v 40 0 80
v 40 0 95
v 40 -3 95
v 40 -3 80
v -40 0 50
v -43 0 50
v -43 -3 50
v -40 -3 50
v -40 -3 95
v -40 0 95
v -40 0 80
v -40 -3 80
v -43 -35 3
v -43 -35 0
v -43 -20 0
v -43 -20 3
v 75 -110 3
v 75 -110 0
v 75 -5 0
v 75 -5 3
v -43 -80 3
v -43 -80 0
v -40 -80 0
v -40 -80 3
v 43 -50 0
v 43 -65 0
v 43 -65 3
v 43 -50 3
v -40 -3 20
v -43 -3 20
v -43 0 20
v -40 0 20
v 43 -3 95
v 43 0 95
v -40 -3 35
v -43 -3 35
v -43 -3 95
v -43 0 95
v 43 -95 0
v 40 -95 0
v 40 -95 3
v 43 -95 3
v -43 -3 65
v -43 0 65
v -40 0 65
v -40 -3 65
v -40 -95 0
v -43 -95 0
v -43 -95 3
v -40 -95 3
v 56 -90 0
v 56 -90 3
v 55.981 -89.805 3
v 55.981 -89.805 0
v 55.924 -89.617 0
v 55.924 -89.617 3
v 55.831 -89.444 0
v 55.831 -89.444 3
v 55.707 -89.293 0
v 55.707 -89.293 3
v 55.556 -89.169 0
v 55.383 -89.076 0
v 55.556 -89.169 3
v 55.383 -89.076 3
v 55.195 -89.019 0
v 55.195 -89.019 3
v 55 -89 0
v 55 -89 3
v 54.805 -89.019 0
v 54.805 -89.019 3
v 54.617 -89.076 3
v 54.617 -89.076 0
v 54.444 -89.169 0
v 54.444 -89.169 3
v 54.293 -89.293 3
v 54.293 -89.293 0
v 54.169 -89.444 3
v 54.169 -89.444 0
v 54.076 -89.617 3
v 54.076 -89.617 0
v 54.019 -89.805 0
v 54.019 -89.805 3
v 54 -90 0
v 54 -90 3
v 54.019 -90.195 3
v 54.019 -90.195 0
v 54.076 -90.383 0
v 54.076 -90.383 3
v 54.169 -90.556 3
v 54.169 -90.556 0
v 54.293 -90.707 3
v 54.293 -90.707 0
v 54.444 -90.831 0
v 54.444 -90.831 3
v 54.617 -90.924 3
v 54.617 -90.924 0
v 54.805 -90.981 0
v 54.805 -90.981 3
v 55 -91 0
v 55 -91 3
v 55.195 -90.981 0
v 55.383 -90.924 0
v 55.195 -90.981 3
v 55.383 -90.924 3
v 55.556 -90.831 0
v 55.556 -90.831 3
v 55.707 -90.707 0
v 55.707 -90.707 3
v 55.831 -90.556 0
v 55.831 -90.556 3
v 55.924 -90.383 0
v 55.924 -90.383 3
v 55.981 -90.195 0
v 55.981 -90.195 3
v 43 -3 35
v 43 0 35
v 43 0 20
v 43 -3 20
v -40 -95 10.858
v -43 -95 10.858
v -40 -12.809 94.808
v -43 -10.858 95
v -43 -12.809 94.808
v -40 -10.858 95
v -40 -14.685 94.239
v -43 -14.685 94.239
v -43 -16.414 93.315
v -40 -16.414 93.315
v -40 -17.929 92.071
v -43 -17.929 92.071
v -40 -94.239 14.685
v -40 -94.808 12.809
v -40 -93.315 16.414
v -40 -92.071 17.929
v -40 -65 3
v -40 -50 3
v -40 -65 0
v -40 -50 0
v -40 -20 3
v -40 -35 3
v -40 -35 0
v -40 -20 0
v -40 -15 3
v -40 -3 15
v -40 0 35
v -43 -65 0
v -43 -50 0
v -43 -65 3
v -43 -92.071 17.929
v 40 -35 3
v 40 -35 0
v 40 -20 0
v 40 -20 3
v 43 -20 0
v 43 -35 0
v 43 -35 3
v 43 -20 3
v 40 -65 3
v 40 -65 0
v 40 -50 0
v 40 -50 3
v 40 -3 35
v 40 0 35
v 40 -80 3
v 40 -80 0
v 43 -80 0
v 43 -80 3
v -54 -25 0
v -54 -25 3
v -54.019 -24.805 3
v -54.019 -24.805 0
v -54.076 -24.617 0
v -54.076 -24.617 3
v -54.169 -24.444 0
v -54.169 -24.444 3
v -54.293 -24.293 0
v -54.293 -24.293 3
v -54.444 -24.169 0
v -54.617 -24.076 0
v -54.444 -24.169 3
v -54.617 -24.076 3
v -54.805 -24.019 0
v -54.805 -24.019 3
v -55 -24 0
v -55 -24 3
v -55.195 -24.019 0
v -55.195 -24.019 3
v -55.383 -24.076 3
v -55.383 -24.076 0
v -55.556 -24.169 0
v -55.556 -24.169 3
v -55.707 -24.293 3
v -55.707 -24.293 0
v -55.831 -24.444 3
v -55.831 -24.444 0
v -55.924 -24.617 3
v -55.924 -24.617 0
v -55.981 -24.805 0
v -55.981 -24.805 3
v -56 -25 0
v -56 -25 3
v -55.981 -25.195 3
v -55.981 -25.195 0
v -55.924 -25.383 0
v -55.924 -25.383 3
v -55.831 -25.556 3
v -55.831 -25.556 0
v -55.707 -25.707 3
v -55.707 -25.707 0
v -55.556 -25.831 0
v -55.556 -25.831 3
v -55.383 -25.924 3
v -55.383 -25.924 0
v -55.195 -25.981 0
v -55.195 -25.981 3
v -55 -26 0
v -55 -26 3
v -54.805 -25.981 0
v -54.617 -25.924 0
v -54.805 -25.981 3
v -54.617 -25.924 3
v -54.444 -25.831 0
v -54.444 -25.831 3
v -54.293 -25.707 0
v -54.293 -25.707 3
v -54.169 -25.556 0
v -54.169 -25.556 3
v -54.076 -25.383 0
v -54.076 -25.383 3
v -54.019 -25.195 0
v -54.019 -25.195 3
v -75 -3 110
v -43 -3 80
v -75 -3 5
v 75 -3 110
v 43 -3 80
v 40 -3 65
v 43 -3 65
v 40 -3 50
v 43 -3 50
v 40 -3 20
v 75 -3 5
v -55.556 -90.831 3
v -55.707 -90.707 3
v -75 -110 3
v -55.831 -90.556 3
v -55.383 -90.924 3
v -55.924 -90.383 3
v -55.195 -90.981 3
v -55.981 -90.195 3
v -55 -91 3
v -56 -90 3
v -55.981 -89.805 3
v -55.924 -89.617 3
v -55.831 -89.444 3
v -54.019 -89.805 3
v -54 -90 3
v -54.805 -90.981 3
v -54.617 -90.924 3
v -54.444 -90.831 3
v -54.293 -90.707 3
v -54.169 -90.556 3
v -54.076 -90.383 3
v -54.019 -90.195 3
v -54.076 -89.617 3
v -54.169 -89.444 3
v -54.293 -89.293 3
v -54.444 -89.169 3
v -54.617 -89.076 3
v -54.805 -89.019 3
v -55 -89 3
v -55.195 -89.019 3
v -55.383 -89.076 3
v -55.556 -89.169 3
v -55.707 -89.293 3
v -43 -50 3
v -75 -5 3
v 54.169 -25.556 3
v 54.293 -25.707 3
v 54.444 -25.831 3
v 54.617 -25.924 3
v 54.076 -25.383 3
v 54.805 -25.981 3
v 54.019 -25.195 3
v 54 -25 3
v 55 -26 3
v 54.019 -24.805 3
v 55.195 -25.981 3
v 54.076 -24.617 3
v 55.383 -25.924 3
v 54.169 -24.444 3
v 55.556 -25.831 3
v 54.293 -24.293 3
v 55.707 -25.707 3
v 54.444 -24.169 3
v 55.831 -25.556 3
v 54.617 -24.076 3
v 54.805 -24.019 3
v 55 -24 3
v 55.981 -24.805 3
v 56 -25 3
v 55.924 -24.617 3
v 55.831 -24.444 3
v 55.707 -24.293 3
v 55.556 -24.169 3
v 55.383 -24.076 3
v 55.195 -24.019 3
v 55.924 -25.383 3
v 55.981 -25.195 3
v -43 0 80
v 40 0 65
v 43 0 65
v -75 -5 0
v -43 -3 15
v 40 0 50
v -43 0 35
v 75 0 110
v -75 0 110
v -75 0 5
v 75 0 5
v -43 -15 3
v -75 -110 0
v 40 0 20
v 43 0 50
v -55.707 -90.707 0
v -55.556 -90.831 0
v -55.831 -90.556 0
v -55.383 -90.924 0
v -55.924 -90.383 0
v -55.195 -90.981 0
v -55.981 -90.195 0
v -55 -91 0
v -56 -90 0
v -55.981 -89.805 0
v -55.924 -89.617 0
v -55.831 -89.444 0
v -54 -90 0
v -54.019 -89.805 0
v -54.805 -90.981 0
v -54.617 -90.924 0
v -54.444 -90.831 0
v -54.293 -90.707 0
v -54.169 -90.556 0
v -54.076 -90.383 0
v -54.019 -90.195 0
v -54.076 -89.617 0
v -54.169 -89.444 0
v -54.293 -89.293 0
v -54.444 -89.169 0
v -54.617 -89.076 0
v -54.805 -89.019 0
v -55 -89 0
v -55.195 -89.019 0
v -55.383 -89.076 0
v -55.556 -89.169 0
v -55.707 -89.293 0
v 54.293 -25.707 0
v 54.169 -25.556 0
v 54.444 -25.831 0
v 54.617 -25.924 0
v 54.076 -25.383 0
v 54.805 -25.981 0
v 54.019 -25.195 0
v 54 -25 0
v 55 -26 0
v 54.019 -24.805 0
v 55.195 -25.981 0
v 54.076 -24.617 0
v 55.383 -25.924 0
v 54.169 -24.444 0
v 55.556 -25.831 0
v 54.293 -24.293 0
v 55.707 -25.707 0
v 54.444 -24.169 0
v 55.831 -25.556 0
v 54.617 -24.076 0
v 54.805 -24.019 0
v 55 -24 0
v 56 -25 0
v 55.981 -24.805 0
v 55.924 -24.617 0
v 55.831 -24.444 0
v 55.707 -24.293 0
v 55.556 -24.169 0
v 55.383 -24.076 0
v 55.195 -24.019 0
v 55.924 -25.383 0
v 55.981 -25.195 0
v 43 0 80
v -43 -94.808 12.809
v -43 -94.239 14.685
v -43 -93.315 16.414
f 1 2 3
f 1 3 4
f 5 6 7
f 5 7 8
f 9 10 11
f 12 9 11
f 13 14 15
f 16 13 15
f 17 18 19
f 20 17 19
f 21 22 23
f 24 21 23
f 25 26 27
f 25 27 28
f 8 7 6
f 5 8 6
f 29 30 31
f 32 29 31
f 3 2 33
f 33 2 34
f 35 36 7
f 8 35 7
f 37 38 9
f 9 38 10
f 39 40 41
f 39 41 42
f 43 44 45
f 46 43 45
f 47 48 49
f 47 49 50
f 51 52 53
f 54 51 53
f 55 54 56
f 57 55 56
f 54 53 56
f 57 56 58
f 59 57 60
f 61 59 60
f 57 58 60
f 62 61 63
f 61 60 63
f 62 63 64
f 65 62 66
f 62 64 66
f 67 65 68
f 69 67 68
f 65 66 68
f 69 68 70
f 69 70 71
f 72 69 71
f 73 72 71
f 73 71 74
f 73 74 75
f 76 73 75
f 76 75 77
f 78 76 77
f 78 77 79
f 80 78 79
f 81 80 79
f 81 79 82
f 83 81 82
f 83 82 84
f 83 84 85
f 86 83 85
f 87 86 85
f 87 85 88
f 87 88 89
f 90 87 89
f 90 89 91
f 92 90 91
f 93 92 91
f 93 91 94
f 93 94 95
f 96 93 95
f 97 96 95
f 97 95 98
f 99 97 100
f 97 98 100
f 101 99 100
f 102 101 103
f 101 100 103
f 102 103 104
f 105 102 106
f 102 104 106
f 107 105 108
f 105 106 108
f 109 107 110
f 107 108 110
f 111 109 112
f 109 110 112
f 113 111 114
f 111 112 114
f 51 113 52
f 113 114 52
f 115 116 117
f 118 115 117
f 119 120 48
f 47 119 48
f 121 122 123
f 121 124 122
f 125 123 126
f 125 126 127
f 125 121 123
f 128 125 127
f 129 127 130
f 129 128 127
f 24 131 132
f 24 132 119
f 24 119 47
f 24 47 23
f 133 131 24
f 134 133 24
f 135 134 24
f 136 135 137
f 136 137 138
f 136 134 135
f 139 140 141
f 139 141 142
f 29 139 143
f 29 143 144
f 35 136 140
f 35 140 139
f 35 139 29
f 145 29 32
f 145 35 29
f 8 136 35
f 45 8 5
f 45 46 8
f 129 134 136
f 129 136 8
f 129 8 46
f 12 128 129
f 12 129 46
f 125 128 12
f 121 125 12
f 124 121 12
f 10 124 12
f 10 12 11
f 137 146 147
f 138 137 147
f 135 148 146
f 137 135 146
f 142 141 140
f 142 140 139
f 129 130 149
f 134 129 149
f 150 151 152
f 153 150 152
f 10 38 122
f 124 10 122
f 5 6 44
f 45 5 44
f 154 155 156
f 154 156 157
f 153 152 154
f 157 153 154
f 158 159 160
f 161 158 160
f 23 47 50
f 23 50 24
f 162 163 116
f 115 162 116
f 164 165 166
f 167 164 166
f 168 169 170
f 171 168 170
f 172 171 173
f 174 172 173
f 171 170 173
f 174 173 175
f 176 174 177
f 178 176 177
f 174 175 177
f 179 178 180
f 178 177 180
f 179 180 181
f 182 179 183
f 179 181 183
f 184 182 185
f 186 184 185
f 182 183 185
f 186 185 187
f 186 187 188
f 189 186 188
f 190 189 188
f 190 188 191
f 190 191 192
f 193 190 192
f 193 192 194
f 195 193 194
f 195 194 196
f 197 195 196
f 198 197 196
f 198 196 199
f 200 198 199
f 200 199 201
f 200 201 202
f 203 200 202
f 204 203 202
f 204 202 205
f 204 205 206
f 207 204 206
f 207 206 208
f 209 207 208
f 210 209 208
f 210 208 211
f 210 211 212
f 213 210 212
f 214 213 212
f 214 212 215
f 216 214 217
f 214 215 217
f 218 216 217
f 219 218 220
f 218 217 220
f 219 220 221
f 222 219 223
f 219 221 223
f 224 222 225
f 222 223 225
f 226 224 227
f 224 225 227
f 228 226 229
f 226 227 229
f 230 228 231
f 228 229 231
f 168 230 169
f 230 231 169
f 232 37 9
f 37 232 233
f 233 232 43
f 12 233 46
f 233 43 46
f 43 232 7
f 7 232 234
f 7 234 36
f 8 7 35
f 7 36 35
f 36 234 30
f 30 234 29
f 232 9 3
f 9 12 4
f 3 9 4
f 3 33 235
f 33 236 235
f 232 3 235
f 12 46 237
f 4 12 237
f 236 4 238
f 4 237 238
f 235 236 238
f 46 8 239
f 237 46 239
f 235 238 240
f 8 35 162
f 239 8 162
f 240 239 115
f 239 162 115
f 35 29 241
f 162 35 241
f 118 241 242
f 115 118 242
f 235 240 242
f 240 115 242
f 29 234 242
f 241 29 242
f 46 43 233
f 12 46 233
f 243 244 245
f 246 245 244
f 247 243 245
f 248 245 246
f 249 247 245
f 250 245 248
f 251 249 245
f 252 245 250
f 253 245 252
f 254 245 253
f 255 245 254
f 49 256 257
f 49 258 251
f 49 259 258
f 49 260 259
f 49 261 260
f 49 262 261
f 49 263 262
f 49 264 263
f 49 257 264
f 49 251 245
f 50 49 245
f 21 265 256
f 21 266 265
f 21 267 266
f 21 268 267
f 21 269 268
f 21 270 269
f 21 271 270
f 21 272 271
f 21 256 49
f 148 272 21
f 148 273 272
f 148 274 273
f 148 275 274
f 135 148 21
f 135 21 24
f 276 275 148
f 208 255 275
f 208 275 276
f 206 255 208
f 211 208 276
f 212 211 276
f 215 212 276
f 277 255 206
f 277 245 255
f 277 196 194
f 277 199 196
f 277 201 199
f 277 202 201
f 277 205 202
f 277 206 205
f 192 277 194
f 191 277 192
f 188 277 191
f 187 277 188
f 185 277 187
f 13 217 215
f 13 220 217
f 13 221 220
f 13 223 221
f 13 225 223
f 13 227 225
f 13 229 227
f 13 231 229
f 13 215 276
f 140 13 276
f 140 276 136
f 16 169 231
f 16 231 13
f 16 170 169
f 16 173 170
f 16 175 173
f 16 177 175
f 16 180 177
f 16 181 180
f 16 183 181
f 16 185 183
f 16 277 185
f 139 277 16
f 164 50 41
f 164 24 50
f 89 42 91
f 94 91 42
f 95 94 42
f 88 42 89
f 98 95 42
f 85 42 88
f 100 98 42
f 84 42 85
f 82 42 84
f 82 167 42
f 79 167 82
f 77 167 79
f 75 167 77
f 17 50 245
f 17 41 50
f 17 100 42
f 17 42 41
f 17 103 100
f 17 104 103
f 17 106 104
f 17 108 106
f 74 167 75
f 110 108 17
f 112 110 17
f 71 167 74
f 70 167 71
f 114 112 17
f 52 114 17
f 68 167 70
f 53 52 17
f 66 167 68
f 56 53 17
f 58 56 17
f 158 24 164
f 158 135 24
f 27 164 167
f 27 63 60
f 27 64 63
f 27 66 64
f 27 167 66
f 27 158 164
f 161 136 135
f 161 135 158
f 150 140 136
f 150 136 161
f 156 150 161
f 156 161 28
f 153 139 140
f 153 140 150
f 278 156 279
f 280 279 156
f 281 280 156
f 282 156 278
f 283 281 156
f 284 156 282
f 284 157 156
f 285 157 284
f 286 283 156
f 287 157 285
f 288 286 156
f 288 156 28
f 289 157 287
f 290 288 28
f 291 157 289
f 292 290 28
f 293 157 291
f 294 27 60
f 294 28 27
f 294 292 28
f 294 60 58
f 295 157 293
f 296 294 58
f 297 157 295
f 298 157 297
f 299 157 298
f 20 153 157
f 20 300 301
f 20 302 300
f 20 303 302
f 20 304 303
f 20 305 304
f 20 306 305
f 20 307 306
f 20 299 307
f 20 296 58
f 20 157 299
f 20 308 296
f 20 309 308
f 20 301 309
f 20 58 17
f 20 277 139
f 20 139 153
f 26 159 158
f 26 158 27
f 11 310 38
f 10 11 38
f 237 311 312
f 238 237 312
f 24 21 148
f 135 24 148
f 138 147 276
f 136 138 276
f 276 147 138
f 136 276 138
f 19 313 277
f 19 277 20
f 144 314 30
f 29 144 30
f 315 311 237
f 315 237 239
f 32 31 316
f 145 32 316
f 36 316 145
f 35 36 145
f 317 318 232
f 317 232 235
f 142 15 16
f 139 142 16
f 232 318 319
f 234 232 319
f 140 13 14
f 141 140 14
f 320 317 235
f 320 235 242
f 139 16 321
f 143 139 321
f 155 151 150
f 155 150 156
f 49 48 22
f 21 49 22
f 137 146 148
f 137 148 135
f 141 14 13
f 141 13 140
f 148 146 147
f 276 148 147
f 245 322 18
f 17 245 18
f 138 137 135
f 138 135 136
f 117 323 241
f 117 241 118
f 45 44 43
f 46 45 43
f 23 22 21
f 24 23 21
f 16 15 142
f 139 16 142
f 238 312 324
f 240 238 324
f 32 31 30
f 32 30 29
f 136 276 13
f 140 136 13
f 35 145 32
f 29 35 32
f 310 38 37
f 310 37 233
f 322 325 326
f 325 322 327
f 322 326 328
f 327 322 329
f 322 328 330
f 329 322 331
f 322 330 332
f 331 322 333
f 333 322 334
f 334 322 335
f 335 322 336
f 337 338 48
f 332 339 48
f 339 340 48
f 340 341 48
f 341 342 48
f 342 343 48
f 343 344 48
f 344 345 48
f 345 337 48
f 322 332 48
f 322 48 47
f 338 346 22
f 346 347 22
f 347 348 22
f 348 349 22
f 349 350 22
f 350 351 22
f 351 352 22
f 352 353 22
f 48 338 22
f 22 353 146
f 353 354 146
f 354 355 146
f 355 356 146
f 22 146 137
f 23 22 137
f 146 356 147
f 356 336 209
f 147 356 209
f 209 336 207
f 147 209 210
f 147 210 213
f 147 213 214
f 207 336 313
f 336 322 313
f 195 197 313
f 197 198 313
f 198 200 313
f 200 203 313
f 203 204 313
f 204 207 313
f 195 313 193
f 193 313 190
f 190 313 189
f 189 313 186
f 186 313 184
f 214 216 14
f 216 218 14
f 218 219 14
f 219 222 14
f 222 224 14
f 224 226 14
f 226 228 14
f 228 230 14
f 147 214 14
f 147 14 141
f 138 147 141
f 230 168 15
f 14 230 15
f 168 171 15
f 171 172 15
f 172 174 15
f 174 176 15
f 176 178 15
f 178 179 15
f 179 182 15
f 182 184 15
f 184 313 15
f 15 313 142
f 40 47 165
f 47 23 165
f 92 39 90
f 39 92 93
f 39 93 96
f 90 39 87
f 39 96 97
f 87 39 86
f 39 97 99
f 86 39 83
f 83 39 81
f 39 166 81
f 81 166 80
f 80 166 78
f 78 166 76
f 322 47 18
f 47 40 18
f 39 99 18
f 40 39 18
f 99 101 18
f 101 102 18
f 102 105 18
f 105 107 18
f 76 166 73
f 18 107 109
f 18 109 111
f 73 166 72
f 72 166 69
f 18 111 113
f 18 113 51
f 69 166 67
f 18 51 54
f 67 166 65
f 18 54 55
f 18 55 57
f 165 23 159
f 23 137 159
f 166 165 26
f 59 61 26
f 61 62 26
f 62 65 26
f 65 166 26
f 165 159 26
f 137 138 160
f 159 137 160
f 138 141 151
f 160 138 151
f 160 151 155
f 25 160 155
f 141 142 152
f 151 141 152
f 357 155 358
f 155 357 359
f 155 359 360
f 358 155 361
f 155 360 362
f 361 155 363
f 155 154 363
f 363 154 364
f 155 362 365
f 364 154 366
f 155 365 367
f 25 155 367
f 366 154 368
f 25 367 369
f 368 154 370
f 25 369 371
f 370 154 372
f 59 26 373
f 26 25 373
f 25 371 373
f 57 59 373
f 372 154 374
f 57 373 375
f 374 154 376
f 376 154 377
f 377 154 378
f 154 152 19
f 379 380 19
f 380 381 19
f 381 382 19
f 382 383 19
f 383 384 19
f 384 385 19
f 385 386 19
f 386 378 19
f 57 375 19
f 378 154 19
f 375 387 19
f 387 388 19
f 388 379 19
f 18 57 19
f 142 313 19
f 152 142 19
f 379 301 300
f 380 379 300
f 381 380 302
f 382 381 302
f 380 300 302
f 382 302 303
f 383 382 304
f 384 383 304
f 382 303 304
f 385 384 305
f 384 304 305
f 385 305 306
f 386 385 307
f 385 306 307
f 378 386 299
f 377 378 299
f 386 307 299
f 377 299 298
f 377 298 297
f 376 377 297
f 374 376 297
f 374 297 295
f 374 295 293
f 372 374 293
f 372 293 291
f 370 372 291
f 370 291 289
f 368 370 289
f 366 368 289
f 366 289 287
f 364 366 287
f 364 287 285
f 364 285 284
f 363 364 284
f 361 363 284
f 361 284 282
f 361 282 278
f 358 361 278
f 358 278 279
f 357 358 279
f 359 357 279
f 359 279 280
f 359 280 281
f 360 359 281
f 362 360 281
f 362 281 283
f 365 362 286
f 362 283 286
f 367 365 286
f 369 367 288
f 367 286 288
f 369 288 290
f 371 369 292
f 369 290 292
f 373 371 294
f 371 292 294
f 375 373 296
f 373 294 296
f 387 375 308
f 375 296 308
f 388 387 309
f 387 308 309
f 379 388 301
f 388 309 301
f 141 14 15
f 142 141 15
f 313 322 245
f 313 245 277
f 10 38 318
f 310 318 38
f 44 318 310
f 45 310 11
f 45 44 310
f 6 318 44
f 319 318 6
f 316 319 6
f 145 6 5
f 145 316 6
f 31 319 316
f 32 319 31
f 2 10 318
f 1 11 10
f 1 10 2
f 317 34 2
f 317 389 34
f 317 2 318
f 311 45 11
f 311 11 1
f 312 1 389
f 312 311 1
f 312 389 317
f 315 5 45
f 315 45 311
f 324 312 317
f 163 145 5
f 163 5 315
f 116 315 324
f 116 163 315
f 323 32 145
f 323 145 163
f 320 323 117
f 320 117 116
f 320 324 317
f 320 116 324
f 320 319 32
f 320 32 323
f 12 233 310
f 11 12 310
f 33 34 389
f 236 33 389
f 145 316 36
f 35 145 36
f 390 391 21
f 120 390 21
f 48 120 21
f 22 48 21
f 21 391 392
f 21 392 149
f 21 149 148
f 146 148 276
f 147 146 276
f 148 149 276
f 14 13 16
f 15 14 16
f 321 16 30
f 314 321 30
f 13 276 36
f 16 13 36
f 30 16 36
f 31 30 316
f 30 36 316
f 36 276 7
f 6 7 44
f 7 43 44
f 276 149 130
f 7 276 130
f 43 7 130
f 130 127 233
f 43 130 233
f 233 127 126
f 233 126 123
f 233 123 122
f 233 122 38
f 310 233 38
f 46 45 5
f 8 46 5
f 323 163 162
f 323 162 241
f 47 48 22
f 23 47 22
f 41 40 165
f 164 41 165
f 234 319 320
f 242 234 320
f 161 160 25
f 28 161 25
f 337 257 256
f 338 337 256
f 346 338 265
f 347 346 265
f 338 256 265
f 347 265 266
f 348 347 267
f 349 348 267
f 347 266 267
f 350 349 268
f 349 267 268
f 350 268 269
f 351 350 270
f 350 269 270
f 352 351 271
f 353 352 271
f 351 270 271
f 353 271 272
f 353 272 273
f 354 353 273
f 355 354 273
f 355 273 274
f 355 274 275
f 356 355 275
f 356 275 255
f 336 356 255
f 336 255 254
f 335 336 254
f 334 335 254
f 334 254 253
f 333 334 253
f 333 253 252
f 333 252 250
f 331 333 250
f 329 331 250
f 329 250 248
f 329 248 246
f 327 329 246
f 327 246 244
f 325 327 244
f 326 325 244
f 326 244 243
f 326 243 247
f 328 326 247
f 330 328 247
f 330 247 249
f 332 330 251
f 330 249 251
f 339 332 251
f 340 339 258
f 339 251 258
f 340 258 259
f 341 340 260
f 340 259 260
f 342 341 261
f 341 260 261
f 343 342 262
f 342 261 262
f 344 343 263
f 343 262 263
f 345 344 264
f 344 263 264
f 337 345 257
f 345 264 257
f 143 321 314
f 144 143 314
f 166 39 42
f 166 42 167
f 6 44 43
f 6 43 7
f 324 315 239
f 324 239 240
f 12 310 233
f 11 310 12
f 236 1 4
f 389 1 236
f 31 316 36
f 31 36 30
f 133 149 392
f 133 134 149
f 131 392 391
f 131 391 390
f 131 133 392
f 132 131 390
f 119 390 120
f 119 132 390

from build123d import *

# Parameters (mm, degrees)
F0_W     = 150
F0_H     = 105
F0_W_2   = 3
F0_H_2   = 15
F1_DEPTH = 3
F6_DEPTH = 3
F7_R     = 10
F8_R     = 1
F9_DEPTH = 25


with BuildPart() as f1:
    # F0 (on Top) → F1 (new body)
    with BuildSketch(Plane.XY):
        with Locations((0, -57.5)):
            Rectangle(F0_W, F0_H)
        with Locations((-41.5, -87.5)):
            Rectangle(F0_W_2, F0_H_2, mode=Mode.SUBTRACT)
        with Locations((41.5, -87.5)):
            Rectangle(F0_W_2, F0_H_2, mode=Mode.SUBTRACT)
        with Locations((-41.5, -57.5)):
            Rectangle(F0_W_2, F0_H_2, mode=Mode.SUBTRACT)
        with Locations((-41.5, -27.5)):
            Rectangle(F0_W_2, F0_H_2, mode=Mode.SUBTRACT)
        with Locations((41.5, -57.5)):
            Rectangle(F0_W_2, F0_H_2, mode=Mode.SUBTRACT)
        with Locations((41.5, -27.5)):
            Rectangle(F0_W_2, F0_H_2, mode=Mode.SUBTRACT)
    extrude(amount=F1_DEPTH)


with BuildPart() as f4_1:
    # F4: instance of F1
    add(f1.part.mirror(Plane(origin=(0, 0, 0), x_dir=(-1, 0, 0), z_dir=(0, 0.7071067812, 0.7071067812))))


with BuildPart() as f6:
    # F5 (on face) → F6 (new body)
    with BuildSketch(Plane.YZ.offset(-43)):
        Polygon((0, 80), (0, 95), (-15, 95), (-95, 15), (-95, 0), (-80, 0), (-80, 3), (-65, 3), (-65, 0), (-50, 0), (-50, 3), (-35, 3), (-35, 0), (-20, 0), (-20, 3), (-15, 3), (-3, 15), (-3, 20), (0, 20), (0, 35), (-3, 35), (-3, 50), (0, 50), (0, 65), (-3, 65), (-3, 80), align=None)
    extrude(amount=F6_DEPTH)

    # F7
    f7_edges = [f6.edges().sort_by_distance(p)[0] for p in [
        (-41.5, -15, 95),
        (-41.5, -95, 15),
    ]]
    fillet(f7_edges, radius=F7_R)


with BuildPart() as f1_1:
    add(f1.part)

    # F8 (on face) → F9 (cut)
    with BuildSketch(Plane.XY.offset(3)):
        with Locations((-55, -25)):
            Circle(F8_R)
        with Locations((-55, -90)):
            Circle(F8_R)
        with Locations((55, -25)):
            Circle(F8_R)
        with Locations((55, -90)):
            Circle(F8_R)
    extrude(amount=-F9_DEPTH, mode=Mode.SUBTRACT)


solid = Compound([f4_1.part, f6.part, f1_1.part])
